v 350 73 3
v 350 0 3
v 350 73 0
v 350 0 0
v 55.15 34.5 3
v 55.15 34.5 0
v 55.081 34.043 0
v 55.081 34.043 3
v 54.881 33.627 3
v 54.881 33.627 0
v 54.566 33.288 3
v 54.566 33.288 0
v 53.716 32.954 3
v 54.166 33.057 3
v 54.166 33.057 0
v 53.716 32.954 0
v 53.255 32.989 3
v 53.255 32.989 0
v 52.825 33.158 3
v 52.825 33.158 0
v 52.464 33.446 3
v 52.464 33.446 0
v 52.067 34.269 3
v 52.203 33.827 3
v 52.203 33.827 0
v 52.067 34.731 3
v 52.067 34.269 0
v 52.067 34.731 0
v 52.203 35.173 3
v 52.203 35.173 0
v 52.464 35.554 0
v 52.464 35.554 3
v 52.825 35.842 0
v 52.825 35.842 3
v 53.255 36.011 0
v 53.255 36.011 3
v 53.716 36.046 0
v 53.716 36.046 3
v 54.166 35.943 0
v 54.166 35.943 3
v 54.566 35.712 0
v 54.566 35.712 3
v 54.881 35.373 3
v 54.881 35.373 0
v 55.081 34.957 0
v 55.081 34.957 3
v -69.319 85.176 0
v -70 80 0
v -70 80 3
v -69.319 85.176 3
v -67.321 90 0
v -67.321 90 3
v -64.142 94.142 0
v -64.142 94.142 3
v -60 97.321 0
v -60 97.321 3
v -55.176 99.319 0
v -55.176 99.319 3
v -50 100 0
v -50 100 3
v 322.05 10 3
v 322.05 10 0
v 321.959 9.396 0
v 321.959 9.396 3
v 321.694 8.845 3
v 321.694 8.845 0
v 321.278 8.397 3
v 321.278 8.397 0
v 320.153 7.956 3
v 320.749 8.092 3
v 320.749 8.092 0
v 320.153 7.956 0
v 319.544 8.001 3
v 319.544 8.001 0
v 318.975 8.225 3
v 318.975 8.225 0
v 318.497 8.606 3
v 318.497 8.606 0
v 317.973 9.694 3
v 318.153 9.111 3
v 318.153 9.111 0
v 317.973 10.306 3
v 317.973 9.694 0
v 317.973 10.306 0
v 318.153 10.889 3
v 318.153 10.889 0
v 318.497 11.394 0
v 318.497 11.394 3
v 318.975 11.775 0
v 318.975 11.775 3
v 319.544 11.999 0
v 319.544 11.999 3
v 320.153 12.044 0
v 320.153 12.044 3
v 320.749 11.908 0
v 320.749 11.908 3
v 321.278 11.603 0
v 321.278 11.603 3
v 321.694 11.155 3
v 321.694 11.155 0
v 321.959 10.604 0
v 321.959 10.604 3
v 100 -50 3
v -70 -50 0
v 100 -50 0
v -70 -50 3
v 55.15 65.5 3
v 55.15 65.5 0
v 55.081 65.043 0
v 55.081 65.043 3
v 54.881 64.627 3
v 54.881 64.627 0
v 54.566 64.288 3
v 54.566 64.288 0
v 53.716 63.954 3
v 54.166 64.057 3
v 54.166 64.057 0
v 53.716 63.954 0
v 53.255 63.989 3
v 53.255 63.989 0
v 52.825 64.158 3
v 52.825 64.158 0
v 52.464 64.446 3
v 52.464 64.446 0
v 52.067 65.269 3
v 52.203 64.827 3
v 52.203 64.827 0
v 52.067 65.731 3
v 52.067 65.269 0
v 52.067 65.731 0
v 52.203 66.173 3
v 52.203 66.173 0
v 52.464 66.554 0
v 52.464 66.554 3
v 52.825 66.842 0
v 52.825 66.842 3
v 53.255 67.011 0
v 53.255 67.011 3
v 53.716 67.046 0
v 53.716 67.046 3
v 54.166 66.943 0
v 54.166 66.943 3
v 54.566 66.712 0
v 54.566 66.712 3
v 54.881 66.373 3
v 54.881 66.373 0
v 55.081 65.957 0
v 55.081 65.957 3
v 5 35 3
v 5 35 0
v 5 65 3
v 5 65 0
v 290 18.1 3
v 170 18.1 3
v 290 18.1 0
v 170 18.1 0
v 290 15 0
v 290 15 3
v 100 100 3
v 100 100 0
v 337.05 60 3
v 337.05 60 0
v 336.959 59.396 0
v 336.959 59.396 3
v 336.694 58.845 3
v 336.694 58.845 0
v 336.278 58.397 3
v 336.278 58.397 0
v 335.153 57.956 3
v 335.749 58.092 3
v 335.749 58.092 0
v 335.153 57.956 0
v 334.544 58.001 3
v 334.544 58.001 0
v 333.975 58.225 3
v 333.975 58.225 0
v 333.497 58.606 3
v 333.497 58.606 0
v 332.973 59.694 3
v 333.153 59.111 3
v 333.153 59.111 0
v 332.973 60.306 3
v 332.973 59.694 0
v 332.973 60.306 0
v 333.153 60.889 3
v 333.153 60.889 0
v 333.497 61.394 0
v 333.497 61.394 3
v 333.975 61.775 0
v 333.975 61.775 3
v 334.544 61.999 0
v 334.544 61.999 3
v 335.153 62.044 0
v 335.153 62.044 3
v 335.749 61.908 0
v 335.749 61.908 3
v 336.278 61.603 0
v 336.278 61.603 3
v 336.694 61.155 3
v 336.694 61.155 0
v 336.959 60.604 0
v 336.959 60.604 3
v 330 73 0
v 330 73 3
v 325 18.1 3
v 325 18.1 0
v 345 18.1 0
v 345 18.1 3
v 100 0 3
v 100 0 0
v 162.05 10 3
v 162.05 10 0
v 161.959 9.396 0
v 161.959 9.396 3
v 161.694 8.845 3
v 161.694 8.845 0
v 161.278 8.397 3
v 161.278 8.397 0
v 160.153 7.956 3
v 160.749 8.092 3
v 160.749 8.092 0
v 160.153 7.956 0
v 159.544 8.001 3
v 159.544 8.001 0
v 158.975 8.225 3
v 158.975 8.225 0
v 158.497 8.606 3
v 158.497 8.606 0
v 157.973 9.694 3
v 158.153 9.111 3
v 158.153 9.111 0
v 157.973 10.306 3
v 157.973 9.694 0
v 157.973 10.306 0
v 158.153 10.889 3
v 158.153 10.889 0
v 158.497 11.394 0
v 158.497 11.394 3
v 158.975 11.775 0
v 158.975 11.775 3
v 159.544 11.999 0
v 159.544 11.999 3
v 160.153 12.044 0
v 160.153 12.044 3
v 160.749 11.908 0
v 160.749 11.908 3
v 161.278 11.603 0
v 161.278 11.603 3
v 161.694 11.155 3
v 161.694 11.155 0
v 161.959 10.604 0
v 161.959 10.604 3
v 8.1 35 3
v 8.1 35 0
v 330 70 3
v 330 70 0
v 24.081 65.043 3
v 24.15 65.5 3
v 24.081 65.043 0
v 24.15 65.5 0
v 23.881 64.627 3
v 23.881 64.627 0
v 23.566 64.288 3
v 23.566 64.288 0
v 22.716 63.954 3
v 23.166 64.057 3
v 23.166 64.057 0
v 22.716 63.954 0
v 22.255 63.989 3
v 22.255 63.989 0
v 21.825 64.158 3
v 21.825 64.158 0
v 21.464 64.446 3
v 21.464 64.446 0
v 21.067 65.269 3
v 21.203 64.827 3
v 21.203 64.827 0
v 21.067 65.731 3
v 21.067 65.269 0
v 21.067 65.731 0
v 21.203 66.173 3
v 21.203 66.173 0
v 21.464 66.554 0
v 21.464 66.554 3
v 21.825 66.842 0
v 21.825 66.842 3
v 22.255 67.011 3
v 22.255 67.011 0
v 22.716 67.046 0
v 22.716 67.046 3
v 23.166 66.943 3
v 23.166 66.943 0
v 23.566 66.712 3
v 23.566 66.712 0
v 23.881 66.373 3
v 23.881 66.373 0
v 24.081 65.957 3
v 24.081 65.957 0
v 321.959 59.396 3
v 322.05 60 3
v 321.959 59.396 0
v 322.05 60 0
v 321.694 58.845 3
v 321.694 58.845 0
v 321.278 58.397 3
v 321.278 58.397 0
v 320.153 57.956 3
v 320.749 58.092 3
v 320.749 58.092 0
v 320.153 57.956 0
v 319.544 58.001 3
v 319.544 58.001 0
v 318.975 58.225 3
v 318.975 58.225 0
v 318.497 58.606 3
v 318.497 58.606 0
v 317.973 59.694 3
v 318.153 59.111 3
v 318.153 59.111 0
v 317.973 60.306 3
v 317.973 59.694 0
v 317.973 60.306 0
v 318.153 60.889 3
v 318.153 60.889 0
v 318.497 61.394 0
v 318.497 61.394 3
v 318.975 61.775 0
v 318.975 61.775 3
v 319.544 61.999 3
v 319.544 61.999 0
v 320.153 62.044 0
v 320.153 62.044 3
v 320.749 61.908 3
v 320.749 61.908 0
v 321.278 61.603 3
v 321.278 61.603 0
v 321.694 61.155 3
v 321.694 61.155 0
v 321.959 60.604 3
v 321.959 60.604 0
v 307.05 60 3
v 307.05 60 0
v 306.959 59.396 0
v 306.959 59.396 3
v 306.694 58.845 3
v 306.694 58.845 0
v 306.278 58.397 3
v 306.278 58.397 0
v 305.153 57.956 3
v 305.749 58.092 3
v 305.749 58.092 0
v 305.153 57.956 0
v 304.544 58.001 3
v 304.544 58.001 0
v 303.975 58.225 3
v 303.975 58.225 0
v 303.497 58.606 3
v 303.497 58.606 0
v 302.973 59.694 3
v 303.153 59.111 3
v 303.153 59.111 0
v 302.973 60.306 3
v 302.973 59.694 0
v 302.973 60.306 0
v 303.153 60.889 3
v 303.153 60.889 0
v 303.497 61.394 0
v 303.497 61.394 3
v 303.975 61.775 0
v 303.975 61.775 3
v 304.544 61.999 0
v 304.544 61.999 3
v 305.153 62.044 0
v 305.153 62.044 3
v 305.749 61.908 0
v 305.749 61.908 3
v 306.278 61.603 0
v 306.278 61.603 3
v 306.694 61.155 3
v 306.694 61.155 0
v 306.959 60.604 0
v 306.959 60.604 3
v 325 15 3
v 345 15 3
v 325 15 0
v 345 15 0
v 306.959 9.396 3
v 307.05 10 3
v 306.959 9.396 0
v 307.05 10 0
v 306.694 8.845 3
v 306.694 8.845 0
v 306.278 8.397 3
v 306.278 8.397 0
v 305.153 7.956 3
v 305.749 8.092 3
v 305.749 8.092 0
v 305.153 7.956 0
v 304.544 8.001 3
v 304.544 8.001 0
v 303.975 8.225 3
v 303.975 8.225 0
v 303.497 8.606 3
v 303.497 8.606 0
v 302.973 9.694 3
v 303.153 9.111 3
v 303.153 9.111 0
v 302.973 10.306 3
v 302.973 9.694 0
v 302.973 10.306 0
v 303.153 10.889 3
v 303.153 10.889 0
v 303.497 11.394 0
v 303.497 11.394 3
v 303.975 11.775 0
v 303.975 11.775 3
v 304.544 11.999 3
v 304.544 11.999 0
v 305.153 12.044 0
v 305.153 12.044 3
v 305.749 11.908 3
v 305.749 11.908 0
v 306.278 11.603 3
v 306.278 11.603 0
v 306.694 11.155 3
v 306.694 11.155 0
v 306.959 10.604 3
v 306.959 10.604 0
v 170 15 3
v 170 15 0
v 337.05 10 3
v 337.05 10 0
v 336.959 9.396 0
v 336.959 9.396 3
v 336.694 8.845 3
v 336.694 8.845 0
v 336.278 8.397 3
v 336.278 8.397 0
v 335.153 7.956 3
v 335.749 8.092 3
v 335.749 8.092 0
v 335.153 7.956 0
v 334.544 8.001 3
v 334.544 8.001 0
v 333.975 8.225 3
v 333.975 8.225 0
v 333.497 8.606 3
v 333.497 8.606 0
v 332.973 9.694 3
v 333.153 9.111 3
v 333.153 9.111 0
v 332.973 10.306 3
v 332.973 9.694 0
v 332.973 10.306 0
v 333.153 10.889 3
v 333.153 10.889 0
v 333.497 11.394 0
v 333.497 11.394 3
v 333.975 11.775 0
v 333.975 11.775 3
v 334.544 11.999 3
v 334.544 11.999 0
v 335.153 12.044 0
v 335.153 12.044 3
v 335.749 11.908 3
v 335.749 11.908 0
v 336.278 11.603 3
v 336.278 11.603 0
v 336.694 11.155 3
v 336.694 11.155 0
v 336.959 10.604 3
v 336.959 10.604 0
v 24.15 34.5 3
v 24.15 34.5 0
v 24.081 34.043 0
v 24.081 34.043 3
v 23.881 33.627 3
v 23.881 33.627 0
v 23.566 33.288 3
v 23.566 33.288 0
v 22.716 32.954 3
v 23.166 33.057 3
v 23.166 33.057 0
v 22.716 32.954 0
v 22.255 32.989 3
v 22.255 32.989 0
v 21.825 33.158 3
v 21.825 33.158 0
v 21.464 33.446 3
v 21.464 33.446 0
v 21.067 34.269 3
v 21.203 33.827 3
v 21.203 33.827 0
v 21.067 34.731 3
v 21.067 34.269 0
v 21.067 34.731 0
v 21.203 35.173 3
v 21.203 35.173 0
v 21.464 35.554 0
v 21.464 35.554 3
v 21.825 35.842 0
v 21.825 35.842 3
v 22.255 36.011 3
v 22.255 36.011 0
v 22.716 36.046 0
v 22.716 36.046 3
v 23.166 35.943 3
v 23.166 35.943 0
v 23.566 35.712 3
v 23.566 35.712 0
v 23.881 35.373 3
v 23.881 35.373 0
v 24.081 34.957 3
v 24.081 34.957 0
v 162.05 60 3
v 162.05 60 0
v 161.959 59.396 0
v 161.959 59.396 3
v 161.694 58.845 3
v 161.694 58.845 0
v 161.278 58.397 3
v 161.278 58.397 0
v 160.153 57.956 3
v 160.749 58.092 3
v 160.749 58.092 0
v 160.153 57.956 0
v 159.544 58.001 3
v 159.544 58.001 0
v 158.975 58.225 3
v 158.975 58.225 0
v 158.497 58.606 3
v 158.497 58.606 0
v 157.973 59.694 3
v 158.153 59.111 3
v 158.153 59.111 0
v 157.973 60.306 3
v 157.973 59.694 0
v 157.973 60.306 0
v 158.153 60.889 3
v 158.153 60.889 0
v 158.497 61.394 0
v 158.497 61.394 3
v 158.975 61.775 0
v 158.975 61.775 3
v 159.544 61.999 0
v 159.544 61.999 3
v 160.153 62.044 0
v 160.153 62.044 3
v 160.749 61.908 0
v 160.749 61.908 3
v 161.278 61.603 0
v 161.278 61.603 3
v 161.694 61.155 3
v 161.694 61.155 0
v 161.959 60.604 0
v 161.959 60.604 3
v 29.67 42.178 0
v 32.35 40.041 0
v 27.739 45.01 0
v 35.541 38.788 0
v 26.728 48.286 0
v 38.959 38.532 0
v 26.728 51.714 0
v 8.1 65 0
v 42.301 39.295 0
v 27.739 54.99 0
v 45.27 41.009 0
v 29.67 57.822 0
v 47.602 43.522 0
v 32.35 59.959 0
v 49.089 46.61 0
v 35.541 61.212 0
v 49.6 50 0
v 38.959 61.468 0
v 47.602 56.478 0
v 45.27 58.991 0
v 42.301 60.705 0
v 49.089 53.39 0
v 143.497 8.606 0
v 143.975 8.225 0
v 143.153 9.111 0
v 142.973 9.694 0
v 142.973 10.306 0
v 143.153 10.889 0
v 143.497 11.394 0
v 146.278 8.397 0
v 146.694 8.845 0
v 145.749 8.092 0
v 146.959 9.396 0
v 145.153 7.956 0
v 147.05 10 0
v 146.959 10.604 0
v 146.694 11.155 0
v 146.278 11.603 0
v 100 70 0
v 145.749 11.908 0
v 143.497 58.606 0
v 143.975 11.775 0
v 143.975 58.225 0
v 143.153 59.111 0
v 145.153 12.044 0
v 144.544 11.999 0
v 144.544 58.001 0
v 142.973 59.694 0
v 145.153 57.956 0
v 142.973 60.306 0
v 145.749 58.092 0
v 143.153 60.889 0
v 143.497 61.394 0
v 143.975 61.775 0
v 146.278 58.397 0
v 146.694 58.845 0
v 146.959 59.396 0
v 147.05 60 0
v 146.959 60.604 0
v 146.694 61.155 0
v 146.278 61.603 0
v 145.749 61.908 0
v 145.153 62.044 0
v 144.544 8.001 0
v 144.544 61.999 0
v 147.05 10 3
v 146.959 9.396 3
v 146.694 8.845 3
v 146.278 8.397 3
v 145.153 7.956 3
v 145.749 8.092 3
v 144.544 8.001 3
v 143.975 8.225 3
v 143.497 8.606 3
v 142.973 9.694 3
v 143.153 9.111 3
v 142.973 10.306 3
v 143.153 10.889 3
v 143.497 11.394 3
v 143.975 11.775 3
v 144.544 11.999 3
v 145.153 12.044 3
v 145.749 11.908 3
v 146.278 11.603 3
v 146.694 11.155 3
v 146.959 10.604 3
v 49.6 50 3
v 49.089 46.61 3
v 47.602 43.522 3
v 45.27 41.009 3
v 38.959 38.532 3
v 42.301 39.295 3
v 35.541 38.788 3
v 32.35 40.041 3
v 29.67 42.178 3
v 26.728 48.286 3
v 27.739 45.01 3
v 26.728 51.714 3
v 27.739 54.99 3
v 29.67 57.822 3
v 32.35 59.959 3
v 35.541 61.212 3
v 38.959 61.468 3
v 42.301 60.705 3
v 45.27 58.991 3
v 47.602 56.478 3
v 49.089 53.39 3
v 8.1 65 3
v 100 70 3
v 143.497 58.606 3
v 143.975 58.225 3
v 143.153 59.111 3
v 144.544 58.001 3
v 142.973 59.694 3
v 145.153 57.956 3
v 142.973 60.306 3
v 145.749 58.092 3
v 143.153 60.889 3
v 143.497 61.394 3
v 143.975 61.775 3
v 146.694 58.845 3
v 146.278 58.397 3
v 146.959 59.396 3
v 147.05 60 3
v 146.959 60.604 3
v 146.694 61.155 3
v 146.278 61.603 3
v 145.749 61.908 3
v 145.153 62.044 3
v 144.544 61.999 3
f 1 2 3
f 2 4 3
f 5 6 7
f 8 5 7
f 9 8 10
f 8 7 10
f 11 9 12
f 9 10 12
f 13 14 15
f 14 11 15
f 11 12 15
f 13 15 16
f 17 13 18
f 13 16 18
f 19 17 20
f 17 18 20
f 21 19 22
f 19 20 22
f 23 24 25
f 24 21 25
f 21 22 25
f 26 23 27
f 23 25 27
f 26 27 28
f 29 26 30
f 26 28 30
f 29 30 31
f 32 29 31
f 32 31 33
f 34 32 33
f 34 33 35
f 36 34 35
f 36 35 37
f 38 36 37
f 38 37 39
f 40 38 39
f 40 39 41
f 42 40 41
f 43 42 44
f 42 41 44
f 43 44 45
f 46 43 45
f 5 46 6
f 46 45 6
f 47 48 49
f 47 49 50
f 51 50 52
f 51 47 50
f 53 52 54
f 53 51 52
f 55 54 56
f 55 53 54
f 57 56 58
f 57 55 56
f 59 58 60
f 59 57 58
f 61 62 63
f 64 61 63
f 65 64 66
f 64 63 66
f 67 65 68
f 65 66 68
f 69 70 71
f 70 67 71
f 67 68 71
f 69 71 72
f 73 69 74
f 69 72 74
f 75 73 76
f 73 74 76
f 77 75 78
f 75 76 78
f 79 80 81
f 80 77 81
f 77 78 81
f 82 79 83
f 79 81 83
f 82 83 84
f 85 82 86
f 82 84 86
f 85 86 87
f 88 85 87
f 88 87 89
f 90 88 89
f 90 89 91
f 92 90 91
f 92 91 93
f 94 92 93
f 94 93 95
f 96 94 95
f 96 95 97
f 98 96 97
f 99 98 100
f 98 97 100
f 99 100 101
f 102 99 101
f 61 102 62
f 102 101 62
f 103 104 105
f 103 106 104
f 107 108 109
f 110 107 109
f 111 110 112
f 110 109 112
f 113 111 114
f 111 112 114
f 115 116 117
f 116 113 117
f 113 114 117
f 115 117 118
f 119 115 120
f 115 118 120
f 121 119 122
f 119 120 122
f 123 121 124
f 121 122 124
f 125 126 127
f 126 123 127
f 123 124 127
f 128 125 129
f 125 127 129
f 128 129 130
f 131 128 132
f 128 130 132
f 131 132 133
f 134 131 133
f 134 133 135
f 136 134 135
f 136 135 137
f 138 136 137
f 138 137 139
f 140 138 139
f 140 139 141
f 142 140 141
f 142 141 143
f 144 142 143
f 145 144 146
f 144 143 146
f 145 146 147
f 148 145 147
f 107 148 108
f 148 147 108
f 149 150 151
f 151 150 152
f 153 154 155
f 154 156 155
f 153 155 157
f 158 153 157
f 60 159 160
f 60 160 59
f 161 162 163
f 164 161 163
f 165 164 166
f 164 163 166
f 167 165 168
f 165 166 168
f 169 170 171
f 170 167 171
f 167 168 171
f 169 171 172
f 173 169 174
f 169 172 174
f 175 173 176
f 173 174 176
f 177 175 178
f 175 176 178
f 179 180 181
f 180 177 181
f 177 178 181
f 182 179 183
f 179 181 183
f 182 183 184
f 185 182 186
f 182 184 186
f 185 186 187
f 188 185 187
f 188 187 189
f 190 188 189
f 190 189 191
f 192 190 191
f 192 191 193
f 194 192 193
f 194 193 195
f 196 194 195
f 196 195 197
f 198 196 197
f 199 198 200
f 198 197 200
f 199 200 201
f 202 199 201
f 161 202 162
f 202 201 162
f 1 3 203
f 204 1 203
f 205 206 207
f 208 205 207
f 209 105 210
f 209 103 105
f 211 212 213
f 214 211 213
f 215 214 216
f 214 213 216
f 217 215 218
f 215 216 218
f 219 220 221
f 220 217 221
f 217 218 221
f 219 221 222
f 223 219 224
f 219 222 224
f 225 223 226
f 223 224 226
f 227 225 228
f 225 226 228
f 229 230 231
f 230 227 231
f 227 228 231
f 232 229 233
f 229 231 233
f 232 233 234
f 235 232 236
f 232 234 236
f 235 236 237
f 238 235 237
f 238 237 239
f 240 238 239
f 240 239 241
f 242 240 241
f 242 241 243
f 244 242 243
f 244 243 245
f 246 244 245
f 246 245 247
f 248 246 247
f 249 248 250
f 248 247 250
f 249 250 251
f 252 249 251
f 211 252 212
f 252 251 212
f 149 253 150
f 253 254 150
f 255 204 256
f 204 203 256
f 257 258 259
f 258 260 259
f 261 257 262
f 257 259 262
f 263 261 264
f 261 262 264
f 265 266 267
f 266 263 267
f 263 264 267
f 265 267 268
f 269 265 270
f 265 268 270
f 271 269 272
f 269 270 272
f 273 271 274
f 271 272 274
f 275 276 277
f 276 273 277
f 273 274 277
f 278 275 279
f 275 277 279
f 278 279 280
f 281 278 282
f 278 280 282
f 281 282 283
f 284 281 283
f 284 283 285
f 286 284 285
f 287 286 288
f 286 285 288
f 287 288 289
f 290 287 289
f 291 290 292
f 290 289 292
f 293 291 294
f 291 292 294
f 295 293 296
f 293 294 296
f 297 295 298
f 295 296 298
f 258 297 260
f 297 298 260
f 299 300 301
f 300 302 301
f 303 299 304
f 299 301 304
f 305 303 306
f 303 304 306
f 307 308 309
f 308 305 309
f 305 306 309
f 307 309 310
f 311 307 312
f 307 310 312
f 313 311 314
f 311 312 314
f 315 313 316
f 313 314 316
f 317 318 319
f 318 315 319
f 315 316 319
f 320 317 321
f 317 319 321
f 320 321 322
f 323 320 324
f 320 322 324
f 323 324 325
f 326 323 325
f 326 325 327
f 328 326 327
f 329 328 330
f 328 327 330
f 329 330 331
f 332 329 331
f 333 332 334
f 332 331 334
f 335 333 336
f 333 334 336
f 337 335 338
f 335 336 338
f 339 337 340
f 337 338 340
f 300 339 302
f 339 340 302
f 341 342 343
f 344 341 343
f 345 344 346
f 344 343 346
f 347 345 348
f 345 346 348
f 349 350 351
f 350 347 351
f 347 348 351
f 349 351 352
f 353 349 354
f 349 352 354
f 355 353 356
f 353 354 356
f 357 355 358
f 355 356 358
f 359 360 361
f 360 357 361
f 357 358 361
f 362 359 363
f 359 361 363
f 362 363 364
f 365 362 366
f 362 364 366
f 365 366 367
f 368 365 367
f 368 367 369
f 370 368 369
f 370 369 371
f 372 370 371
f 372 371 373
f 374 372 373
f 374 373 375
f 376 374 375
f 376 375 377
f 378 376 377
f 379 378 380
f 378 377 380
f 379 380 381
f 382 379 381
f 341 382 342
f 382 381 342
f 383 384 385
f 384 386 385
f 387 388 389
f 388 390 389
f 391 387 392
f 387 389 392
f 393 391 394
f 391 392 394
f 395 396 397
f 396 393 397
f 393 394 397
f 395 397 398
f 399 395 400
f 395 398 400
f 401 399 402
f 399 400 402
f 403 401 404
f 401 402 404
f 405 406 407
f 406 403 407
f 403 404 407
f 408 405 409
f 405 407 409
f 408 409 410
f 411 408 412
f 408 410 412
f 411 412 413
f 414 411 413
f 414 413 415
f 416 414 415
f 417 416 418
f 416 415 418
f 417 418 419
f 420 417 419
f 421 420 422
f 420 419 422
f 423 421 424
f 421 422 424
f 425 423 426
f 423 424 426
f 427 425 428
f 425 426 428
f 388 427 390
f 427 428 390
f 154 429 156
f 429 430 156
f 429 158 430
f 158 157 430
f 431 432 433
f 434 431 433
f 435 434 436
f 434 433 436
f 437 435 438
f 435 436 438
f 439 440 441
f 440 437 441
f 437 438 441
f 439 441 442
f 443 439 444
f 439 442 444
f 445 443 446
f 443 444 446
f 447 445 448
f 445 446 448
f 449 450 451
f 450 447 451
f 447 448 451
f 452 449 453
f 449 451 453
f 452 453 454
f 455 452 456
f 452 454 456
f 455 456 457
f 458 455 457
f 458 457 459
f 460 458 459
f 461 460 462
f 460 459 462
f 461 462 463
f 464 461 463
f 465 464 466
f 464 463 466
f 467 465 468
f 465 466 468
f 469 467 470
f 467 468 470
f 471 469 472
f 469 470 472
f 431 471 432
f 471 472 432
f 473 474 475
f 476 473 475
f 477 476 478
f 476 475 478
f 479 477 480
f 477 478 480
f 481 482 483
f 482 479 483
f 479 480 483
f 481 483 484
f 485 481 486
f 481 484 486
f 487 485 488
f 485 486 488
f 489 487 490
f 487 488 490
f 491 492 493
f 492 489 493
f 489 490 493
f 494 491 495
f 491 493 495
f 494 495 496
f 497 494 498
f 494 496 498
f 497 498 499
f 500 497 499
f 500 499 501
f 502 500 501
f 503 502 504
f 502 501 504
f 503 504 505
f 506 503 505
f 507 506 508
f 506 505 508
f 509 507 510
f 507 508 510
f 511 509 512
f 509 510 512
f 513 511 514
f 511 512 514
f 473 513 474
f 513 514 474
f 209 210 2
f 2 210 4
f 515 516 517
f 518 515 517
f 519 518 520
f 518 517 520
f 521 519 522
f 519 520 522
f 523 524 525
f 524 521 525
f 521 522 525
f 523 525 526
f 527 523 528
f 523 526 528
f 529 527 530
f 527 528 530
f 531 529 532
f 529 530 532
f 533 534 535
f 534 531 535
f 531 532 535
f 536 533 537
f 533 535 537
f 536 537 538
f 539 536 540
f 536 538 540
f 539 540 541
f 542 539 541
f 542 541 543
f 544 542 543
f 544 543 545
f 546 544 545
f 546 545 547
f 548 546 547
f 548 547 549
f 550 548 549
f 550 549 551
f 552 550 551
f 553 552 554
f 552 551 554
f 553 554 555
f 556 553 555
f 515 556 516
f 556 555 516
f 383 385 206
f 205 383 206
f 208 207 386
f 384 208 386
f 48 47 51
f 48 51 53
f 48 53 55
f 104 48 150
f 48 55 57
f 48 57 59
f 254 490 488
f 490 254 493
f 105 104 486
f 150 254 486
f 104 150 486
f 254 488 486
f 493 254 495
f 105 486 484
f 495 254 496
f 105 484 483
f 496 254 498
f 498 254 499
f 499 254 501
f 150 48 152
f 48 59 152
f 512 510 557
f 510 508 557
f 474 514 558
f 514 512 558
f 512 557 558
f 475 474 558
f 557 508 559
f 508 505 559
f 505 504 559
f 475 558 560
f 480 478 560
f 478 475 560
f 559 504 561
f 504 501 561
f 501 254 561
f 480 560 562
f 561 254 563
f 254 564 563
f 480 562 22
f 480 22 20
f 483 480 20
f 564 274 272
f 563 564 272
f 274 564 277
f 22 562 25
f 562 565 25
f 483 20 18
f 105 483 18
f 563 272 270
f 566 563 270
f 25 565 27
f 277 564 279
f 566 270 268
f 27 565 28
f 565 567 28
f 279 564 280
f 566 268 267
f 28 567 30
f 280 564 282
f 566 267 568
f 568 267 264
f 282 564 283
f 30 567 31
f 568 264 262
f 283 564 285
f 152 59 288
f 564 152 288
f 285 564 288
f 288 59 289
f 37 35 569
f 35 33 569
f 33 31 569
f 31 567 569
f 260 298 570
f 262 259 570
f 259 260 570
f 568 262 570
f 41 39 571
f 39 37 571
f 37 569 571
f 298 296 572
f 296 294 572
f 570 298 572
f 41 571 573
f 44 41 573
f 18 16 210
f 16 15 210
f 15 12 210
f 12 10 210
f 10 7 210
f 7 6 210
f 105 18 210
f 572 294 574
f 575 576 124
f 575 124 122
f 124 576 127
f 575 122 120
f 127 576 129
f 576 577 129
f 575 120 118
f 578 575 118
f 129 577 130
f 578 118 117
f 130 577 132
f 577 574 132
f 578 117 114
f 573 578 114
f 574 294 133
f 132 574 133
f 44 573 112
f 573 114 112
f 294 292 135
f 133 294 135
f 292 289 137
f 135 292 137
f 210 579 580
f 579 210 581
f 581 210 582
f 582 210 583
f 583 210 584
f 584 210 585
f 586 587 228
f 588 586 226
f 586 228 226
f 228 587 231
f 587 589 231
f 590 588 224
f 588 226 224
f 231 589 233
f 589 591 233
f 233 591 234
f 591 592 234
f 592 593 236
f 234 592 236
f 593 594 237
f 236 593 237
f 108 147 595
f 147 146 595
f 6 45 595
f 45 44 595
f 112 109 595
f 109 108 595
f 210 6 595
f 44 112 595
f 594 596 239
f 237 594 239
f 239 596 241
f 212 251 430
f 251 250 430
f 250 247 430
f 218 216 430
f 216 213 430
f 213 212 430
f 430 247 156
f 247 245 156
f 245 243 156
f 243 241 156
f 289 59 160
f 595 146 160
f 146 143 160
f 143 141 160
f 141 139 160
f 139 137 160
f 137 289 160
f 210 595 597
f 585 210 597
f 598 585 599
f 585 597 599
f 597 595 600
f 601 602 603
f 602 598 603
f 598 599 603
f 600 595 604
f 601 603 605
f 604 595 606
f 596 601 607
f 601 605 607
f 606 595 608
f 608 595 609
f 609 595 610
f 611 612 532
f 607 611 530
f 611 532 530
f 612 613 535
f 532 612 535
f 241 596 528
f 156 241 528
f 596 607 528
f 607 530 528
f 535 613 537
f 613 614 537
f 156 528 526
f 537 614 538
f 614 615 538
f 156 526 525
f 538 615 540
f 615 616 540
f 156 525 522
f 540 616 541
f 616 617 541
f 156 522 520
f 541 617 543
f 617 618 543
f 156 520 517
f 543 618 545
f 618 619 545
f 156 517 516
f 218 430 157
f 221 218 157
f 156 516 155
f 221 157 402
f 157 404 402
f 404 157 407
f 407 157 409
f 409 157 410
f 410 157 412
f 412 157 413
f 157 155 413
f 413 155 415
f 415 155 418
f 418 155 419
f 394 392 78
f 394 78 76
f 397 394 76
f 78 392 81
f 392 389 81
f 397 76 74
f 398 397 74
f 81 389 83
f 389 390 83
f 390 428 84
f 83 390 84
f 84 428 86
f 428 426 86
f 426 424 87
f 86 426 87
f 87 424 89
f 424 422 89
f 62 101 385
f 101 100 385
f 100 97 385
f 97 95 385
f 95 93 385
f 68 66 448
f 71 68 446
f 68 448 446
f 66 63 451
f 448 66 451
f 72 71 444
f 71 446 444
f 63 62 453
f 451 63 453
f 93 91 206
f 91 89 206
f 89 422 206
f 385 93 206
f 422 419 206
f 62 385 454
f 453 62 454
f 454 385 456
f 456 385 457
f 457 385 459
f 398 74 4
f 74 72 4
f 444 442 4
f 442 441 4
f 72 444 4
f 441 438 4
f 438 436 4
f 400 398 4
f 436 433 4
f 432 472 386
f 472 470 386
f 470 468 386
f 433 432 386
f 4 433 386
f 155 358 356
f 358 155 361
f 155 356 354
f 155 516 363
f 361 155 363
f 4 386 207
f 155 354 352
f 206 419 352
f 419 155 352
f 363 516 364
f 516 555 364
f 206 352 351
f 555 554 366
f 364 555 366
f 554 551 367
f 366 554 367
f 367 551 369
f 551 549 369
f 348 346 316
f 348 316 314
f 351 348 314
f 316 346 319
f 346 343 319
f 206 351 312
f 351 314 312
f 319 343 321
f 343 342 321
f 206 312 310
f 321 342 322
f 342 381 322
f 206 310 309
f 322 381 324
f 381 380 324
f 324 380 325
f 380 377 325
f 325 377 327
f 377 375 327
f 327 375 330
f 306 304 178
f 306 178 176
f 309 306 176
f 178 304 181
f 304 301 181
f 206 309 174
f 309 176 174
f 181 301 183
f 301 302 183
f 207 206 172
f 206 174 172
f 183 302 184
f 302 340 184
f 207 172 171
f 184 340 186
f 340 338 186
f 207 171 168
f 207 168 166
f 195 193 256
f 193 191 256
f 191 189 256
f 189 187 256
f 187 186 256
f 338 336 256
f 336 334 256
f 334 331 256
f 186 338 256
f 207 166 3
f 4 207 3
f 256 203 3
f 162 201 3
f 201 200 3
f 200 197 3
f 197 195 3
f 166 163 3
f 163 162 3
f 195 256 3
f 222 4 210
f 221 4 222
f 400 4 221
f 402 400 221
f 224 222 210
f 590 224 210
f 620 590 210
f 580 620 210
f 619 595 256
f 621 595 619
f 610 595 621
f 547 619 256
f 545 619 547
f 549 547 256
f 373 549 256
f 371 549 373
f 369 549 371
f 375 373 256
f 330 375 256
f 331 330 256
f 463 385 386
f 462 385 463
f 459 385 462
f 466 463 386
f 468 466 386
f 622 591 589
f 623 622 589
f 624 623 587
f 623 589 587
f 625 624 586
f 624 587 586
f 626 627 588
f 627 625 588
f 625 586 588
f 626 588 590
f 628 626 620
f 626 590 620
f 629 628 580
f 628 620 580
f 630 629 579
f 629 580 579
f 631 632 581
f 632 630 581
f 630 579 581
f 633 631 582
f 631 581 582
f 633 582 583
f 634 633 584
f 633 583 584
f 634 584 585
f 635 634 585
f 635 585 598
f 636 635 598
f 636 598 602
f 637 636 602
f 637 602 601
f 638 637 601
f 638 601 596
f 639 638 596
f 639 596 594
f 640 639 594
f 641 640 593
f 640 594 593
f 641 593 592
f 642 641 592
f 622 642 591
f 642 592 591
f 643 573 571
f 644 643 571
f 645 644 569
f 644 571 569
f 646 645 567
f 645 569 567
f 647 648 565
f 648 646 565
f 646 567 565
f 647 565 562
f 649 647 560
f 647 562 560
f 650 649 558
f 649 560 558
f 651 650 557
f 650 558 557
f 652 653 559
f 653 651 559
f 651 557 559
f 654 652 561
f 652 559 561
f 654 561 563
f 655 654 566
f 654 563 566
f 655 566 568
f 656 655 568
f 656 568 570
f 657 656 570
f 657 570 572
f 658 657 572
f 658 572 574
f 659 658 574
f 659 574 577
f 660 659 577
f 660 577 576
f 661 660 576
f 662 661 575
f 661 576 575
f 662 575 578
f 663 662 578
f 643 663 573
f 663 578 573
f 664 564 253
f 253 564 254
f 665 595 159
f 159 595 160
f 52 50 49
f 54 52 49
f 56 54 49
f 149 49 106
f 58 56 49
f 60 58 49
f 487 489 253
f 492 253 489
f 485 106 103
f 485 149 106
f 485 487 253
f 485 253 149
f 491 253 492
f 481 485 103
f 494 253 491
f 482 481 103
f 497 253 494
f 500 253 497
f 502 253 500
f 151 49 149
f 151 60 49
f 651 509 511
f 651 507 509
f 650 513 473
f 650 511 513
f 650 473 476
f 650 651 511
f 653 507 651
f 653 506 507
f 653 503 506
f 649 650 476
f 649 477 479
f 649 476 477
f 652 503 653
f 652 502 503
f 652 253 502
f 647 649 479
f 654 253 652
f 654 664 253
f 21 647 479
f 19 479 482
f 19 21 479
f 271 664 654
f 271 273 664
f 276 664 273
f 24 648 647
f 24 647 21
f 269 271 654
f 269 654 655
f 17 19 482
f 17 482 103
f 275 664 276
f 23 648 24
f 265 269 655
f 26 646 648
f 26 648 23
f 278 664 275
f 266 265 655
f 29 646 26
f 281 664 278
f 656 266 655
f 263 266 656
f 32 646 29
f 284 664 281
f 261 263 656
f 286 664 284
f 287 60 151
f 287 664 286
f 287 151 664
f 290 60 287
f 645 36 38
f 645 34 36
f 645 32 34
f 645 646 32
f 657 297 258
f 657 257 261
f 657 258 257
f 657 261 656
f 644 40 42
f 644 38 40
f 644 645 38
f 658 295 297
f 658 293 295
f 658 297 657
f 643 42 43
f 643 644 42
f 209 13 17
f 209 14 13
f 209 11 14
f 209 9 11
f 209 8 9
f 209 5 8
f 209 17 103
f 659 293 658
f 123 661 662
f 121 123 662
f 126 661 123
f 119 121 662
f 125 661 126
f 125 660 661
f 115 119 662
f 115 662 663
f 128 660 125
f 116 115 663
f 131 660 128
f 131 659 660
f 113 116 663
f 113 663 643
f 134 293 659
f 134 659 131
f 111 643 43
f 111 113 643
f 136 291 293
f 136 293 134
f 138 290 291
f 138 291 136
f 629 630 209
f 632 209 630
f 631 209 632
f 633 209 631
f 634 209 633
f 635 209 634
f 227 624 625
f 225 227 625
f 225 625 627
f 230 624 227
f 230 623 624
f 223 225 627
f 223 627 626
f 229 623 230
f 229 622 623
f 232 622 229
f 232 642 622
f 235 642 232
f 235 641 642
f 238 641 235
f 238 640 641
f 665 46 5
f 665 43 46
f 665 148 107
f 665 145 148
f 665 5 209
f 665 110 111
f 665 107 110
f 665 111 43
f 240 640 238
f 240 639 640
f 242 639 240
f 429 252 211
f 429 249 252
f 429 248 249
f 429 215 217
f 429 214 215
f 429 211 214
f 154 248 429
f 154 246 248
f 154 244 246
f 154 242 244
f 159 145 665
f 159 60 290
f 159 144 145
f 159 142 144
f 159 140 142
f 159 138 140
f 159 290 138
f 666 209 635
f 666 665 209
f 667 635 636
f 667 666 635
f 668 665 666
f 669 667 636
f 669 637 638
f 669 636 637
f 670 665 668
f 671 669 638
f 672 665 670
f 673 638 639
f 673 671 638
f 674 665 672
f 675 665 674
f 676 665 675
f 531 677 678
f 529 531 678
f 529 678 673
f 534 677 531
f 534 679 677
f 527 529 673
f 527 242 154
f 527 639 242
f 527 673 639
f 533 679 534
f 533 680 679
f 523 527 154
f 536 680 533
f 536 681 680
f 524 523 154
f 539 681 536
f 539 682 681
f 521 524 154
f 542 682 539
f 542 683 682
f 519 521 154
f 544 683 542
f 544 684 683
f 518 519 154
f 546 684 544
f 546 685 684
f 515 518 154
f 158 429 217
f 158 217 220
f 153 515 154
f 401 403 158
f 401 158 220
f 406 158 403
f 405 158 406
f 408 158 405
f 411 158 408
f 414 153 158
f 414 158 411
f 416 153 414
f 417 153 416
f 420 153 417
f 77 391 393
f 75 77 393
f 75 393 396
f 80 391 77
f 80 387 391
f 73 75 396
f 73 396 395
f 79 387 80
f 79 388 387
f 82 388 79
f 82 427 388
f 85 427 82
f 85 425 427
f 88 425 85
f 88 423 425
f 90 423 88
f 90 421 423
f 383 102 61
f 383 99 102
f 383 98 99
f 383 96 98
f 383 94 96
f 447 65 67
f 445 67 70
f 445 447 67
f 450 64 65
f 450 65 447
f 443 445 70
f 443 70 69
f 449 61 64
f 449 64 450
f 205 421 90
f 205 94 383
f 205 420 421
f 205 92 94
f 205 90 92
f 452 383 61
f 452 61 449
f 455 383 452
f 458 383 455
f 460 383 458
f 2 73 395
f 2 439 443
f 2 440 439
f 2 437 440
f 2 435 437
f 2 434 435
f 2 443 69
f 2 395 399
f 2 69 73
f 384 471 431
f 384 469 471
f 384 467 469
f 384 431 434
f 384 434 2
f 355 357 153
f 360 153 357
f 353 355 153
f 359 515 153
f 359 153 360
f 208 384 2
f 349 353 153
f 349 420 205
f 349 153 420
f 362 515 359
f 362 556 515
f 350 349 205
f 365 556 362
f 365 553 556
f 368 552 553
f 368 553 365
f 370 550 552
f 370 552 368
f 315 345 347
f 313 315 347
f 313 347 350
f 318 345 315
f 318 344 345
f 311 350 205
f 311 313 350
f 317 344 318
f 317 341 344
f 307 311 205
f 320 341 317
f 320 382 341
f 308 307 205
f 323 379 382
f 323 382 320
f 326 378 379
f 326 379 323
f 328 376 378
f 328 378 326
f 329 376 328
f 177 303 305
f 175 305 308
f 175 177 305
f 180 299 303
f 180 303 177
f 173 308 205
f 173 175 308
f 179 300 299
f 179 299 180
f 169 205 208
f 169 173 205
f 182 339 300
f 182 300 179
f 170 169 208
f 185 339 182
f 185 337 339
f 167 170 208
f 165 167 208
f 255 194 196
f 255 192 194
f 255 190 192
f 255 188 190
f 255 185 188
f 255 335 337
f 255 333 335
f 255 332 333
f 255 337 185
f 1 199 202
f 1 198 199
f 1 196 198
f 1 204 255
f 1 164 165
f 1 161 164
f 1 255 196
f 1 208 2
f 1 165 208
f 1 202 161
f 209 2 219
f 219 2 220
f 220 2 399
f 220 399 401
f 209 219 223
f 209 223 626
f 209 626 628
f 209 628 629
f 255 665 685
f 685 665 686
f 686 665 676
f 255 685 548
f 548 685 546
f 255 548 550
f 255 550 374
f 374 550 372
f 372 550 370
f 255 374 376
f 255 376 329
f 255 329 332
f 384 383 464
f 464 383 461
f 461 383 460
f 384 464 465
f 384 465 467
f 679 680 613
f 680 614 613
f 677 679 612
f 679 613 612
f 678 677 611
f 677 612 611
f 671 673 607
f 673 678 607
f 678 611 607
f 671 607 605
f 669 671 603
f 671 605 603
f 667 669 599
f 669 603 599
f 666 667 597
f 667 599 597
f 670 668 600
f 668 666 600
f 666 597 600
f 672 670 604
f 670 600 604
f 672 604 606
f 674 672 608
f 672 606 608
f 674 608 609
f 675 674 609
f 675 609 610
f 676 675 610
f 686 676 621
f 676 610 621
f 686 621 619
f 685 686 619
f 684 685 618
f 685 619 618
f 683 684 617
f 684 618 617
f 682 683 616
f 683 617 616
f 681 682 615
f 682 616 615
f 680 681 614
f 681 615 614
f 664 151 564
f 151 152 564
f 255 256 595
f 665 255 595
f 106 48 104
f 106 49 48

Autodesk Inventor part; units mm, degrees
ref_plane "YZ Plane" through (0, 0, 0) normal (1, 0, 0) x (0, 1, 0)
ref_plane "XZ Plane" through (0, 0, 0) normal (0, 1, 0) x (-1, 0, 0)
ref_plane "XY Plane" through (0, 0, 0) normal (0, 0, 1) x (1, 0, 0)
sketch "Sketch1" plane through (0, 0, 0) normal (0, 0, 1) x (1, 0, 0)
  line L0 (0, 0) -> (350, 0)
  line L1 (350, 0) -> (350, 70)
  line L2 (350, 70) -> (0, 70)
  line L3 (0, 70) -> (0, 0)
  circle A0 centre (22.6, 65.5) radius 1.55
  circle A1 centre (22.6, 34.5) radius 1.55
  circle A2 centre (53.6, 65.5) radius 1.55
  circle A3 centre (53.6, 34.5) radius 1.55
  circle A4 centre (38.1, 50) radius 11.5
  line L4 (170, 18.1) -> (290, 18.1)
  line L5 (290, 18.1) -> (290, 15)
  line L6 (290, 15) -> (170, 15)
  line L7 (170, 15) -> (170, 18.1)
  line L8 (0, 70) -> (89.6145, 70)
  line L9 (250, 70) -> (287.051, 70)
  line L10 (250, 70) -> (270, 70)
  line L11 (270, 70) -> (270, 73)
  line L12 (270, 73) -> (250, 73)
  line L13 (250, 73) -> (250, 70)
  line L14 (310, 70) -> (310, 73)
  line L15 (310, 73) -> (290, 73)
  line L16 (290, 73) -> (290, 70)
  line L17 (290, 70) -> (327.051, 70)
  line L18 (290, 70) -> (310, 70)
  line L19 (350, 70) -> (350, 73)
  line L20 (350, 73) -> (330, 73)
  line L21 (330, 73) -> (330, 70)
  line L22 (330, 70) -> (367.051, 70)
  line L23 (330, 70) -> (350, 70)
  line L24 (8.1, 35) -> (5, 35)
  line L25 (5, 35) -> (5, 65)
  line L26 (5, 65) -> (8.1, 65)
  line L27 (8.1, 65) -> (8.1, 35)
  line L28 (8.1, 35) -> (5, 65) construction
  line L29 (5, 35) -> (8.1, 65) construction
  circle A5 centre (335, 10) radius 2.05
  circle A6 centre (320, 10) radius 2.05
  circle A7 centre (335, 60) radius 2.05
  circle A8 centre (320, 60) radius 2.05
  circle A9 centre (305, 60) radius 2.05
  circle A10 centre (305, 10) radius 2.05
  circle A11 centre (160, 10) radius 2.05
  circle A12 centre (145, 10) radius 2.05
  circle A13 centre (160, 60) radius 2.05
  circle A14 centre (145, 60) radius 2.05
  line L30 (325, 18.1) -> (345, 18.1)
  line L31 (345, 18.1) -> (345, 15)
  line L32 (345, 15) -> (325, 15)
  line L33 (325, 15) -> (325, 18.1)
  line L34 (0, 70) -> (100, 70)
  line L35 (100, 70) -> (100, 100)
  line L36 (100, 100) -> (0, 100)
  line L37 (0, 100) -> (0, 70)
  point P0 (6.55, 50)
  point P1 (5, 50)
  point P2 (8.1, 50)
  point P3 (170, 16.55)
  point P4 (290, 70)
  point P5 (100, 70)
  dimension "d1" = 3.1
  dimension "d2" = 3.1
  dimension "d3" = 3.1
  dimension "d4" = 3.1
  dimension "d5" = 31
  dimension "d7" = 23
  dimension "d8" = 15.5
  dimension "d9" = 15.5
  dimension "d10" = 70
  dimension "d11" = 31
  dimension "d12" = 3.1
  dimension "d13" = 50
  dimension "d46" = 20
  dimension "d47" = 3
  dimension "d48" = 20
  dimension "d49" = 3
  dimension "d50" = 20
  dimension "d51" = 3
  dimension "d52" = 20
  dimension "d53" = 20
  dimension "d54" = 350
  dimension "d55" = 3.1
  dimension "d56" = 5
  dimension "d57" = 15
  dimension "d58" = 30
  dimension "d59" = 120
  dimension "d63" = 4.1
  dimension "d64" = 4.1
  dimension "d65" = 4.1
  dimension "d66" = 4.1
  dimension "d67" = 4.1
  dimension "d68" = 4.1
  dimension "d69" = 15
  dimension "d70" = 15
  dimension "d71" = 10
  dimension "d72" = 10
  dimension "d73" = 15
  dimension "d79" = 4.1
  dimension "d80" = 4.1
  dimension "d81" = 4.1
  dimension "d82" = 4.1
  dimension "d85" = 15
  dimension "d87" = 10
  dimension "d88" = 10
  dimension "d89" = 10
  dimension "d90" = 60
  dimension "d91" = 5
  dimension "d92" = 20
  dimension "d93" = 15
  dimension "d94" = 100
  dimension "d95" = 30
extrude "Extrusion1" add sketch "Sketch1" along normal blind 3 contours L3 L2 L1 L0 | L37 L36 L35 L2 | L2 L21 L20 L19
sketch "Sketch3" plane through (0, 0, 3) normal (0, 0, 1) x (1, 0, 0)
  line L0 (0, 100) -> (0, 0) projected
  line L1 (0, 100) -> (-70, 100)
  line L2 (-70, 100) -> (-70, -50)
  line L3 (-70, -50) -> (100, -50)
  line L4 (100, -50) -> (100, 0)
  line L5 (0, 0) -> (350, 0) projected
  dimension "d99" = 70
  dimension "d100" = 150
  dimension "d101" = 170
extrude "Extrusion3" add sketch "Sketch3" against normal blind 3
fillet "Fillet1" radius 20 1 edges at (-70, 100, 1.5)
properties part number "Sideboard"
